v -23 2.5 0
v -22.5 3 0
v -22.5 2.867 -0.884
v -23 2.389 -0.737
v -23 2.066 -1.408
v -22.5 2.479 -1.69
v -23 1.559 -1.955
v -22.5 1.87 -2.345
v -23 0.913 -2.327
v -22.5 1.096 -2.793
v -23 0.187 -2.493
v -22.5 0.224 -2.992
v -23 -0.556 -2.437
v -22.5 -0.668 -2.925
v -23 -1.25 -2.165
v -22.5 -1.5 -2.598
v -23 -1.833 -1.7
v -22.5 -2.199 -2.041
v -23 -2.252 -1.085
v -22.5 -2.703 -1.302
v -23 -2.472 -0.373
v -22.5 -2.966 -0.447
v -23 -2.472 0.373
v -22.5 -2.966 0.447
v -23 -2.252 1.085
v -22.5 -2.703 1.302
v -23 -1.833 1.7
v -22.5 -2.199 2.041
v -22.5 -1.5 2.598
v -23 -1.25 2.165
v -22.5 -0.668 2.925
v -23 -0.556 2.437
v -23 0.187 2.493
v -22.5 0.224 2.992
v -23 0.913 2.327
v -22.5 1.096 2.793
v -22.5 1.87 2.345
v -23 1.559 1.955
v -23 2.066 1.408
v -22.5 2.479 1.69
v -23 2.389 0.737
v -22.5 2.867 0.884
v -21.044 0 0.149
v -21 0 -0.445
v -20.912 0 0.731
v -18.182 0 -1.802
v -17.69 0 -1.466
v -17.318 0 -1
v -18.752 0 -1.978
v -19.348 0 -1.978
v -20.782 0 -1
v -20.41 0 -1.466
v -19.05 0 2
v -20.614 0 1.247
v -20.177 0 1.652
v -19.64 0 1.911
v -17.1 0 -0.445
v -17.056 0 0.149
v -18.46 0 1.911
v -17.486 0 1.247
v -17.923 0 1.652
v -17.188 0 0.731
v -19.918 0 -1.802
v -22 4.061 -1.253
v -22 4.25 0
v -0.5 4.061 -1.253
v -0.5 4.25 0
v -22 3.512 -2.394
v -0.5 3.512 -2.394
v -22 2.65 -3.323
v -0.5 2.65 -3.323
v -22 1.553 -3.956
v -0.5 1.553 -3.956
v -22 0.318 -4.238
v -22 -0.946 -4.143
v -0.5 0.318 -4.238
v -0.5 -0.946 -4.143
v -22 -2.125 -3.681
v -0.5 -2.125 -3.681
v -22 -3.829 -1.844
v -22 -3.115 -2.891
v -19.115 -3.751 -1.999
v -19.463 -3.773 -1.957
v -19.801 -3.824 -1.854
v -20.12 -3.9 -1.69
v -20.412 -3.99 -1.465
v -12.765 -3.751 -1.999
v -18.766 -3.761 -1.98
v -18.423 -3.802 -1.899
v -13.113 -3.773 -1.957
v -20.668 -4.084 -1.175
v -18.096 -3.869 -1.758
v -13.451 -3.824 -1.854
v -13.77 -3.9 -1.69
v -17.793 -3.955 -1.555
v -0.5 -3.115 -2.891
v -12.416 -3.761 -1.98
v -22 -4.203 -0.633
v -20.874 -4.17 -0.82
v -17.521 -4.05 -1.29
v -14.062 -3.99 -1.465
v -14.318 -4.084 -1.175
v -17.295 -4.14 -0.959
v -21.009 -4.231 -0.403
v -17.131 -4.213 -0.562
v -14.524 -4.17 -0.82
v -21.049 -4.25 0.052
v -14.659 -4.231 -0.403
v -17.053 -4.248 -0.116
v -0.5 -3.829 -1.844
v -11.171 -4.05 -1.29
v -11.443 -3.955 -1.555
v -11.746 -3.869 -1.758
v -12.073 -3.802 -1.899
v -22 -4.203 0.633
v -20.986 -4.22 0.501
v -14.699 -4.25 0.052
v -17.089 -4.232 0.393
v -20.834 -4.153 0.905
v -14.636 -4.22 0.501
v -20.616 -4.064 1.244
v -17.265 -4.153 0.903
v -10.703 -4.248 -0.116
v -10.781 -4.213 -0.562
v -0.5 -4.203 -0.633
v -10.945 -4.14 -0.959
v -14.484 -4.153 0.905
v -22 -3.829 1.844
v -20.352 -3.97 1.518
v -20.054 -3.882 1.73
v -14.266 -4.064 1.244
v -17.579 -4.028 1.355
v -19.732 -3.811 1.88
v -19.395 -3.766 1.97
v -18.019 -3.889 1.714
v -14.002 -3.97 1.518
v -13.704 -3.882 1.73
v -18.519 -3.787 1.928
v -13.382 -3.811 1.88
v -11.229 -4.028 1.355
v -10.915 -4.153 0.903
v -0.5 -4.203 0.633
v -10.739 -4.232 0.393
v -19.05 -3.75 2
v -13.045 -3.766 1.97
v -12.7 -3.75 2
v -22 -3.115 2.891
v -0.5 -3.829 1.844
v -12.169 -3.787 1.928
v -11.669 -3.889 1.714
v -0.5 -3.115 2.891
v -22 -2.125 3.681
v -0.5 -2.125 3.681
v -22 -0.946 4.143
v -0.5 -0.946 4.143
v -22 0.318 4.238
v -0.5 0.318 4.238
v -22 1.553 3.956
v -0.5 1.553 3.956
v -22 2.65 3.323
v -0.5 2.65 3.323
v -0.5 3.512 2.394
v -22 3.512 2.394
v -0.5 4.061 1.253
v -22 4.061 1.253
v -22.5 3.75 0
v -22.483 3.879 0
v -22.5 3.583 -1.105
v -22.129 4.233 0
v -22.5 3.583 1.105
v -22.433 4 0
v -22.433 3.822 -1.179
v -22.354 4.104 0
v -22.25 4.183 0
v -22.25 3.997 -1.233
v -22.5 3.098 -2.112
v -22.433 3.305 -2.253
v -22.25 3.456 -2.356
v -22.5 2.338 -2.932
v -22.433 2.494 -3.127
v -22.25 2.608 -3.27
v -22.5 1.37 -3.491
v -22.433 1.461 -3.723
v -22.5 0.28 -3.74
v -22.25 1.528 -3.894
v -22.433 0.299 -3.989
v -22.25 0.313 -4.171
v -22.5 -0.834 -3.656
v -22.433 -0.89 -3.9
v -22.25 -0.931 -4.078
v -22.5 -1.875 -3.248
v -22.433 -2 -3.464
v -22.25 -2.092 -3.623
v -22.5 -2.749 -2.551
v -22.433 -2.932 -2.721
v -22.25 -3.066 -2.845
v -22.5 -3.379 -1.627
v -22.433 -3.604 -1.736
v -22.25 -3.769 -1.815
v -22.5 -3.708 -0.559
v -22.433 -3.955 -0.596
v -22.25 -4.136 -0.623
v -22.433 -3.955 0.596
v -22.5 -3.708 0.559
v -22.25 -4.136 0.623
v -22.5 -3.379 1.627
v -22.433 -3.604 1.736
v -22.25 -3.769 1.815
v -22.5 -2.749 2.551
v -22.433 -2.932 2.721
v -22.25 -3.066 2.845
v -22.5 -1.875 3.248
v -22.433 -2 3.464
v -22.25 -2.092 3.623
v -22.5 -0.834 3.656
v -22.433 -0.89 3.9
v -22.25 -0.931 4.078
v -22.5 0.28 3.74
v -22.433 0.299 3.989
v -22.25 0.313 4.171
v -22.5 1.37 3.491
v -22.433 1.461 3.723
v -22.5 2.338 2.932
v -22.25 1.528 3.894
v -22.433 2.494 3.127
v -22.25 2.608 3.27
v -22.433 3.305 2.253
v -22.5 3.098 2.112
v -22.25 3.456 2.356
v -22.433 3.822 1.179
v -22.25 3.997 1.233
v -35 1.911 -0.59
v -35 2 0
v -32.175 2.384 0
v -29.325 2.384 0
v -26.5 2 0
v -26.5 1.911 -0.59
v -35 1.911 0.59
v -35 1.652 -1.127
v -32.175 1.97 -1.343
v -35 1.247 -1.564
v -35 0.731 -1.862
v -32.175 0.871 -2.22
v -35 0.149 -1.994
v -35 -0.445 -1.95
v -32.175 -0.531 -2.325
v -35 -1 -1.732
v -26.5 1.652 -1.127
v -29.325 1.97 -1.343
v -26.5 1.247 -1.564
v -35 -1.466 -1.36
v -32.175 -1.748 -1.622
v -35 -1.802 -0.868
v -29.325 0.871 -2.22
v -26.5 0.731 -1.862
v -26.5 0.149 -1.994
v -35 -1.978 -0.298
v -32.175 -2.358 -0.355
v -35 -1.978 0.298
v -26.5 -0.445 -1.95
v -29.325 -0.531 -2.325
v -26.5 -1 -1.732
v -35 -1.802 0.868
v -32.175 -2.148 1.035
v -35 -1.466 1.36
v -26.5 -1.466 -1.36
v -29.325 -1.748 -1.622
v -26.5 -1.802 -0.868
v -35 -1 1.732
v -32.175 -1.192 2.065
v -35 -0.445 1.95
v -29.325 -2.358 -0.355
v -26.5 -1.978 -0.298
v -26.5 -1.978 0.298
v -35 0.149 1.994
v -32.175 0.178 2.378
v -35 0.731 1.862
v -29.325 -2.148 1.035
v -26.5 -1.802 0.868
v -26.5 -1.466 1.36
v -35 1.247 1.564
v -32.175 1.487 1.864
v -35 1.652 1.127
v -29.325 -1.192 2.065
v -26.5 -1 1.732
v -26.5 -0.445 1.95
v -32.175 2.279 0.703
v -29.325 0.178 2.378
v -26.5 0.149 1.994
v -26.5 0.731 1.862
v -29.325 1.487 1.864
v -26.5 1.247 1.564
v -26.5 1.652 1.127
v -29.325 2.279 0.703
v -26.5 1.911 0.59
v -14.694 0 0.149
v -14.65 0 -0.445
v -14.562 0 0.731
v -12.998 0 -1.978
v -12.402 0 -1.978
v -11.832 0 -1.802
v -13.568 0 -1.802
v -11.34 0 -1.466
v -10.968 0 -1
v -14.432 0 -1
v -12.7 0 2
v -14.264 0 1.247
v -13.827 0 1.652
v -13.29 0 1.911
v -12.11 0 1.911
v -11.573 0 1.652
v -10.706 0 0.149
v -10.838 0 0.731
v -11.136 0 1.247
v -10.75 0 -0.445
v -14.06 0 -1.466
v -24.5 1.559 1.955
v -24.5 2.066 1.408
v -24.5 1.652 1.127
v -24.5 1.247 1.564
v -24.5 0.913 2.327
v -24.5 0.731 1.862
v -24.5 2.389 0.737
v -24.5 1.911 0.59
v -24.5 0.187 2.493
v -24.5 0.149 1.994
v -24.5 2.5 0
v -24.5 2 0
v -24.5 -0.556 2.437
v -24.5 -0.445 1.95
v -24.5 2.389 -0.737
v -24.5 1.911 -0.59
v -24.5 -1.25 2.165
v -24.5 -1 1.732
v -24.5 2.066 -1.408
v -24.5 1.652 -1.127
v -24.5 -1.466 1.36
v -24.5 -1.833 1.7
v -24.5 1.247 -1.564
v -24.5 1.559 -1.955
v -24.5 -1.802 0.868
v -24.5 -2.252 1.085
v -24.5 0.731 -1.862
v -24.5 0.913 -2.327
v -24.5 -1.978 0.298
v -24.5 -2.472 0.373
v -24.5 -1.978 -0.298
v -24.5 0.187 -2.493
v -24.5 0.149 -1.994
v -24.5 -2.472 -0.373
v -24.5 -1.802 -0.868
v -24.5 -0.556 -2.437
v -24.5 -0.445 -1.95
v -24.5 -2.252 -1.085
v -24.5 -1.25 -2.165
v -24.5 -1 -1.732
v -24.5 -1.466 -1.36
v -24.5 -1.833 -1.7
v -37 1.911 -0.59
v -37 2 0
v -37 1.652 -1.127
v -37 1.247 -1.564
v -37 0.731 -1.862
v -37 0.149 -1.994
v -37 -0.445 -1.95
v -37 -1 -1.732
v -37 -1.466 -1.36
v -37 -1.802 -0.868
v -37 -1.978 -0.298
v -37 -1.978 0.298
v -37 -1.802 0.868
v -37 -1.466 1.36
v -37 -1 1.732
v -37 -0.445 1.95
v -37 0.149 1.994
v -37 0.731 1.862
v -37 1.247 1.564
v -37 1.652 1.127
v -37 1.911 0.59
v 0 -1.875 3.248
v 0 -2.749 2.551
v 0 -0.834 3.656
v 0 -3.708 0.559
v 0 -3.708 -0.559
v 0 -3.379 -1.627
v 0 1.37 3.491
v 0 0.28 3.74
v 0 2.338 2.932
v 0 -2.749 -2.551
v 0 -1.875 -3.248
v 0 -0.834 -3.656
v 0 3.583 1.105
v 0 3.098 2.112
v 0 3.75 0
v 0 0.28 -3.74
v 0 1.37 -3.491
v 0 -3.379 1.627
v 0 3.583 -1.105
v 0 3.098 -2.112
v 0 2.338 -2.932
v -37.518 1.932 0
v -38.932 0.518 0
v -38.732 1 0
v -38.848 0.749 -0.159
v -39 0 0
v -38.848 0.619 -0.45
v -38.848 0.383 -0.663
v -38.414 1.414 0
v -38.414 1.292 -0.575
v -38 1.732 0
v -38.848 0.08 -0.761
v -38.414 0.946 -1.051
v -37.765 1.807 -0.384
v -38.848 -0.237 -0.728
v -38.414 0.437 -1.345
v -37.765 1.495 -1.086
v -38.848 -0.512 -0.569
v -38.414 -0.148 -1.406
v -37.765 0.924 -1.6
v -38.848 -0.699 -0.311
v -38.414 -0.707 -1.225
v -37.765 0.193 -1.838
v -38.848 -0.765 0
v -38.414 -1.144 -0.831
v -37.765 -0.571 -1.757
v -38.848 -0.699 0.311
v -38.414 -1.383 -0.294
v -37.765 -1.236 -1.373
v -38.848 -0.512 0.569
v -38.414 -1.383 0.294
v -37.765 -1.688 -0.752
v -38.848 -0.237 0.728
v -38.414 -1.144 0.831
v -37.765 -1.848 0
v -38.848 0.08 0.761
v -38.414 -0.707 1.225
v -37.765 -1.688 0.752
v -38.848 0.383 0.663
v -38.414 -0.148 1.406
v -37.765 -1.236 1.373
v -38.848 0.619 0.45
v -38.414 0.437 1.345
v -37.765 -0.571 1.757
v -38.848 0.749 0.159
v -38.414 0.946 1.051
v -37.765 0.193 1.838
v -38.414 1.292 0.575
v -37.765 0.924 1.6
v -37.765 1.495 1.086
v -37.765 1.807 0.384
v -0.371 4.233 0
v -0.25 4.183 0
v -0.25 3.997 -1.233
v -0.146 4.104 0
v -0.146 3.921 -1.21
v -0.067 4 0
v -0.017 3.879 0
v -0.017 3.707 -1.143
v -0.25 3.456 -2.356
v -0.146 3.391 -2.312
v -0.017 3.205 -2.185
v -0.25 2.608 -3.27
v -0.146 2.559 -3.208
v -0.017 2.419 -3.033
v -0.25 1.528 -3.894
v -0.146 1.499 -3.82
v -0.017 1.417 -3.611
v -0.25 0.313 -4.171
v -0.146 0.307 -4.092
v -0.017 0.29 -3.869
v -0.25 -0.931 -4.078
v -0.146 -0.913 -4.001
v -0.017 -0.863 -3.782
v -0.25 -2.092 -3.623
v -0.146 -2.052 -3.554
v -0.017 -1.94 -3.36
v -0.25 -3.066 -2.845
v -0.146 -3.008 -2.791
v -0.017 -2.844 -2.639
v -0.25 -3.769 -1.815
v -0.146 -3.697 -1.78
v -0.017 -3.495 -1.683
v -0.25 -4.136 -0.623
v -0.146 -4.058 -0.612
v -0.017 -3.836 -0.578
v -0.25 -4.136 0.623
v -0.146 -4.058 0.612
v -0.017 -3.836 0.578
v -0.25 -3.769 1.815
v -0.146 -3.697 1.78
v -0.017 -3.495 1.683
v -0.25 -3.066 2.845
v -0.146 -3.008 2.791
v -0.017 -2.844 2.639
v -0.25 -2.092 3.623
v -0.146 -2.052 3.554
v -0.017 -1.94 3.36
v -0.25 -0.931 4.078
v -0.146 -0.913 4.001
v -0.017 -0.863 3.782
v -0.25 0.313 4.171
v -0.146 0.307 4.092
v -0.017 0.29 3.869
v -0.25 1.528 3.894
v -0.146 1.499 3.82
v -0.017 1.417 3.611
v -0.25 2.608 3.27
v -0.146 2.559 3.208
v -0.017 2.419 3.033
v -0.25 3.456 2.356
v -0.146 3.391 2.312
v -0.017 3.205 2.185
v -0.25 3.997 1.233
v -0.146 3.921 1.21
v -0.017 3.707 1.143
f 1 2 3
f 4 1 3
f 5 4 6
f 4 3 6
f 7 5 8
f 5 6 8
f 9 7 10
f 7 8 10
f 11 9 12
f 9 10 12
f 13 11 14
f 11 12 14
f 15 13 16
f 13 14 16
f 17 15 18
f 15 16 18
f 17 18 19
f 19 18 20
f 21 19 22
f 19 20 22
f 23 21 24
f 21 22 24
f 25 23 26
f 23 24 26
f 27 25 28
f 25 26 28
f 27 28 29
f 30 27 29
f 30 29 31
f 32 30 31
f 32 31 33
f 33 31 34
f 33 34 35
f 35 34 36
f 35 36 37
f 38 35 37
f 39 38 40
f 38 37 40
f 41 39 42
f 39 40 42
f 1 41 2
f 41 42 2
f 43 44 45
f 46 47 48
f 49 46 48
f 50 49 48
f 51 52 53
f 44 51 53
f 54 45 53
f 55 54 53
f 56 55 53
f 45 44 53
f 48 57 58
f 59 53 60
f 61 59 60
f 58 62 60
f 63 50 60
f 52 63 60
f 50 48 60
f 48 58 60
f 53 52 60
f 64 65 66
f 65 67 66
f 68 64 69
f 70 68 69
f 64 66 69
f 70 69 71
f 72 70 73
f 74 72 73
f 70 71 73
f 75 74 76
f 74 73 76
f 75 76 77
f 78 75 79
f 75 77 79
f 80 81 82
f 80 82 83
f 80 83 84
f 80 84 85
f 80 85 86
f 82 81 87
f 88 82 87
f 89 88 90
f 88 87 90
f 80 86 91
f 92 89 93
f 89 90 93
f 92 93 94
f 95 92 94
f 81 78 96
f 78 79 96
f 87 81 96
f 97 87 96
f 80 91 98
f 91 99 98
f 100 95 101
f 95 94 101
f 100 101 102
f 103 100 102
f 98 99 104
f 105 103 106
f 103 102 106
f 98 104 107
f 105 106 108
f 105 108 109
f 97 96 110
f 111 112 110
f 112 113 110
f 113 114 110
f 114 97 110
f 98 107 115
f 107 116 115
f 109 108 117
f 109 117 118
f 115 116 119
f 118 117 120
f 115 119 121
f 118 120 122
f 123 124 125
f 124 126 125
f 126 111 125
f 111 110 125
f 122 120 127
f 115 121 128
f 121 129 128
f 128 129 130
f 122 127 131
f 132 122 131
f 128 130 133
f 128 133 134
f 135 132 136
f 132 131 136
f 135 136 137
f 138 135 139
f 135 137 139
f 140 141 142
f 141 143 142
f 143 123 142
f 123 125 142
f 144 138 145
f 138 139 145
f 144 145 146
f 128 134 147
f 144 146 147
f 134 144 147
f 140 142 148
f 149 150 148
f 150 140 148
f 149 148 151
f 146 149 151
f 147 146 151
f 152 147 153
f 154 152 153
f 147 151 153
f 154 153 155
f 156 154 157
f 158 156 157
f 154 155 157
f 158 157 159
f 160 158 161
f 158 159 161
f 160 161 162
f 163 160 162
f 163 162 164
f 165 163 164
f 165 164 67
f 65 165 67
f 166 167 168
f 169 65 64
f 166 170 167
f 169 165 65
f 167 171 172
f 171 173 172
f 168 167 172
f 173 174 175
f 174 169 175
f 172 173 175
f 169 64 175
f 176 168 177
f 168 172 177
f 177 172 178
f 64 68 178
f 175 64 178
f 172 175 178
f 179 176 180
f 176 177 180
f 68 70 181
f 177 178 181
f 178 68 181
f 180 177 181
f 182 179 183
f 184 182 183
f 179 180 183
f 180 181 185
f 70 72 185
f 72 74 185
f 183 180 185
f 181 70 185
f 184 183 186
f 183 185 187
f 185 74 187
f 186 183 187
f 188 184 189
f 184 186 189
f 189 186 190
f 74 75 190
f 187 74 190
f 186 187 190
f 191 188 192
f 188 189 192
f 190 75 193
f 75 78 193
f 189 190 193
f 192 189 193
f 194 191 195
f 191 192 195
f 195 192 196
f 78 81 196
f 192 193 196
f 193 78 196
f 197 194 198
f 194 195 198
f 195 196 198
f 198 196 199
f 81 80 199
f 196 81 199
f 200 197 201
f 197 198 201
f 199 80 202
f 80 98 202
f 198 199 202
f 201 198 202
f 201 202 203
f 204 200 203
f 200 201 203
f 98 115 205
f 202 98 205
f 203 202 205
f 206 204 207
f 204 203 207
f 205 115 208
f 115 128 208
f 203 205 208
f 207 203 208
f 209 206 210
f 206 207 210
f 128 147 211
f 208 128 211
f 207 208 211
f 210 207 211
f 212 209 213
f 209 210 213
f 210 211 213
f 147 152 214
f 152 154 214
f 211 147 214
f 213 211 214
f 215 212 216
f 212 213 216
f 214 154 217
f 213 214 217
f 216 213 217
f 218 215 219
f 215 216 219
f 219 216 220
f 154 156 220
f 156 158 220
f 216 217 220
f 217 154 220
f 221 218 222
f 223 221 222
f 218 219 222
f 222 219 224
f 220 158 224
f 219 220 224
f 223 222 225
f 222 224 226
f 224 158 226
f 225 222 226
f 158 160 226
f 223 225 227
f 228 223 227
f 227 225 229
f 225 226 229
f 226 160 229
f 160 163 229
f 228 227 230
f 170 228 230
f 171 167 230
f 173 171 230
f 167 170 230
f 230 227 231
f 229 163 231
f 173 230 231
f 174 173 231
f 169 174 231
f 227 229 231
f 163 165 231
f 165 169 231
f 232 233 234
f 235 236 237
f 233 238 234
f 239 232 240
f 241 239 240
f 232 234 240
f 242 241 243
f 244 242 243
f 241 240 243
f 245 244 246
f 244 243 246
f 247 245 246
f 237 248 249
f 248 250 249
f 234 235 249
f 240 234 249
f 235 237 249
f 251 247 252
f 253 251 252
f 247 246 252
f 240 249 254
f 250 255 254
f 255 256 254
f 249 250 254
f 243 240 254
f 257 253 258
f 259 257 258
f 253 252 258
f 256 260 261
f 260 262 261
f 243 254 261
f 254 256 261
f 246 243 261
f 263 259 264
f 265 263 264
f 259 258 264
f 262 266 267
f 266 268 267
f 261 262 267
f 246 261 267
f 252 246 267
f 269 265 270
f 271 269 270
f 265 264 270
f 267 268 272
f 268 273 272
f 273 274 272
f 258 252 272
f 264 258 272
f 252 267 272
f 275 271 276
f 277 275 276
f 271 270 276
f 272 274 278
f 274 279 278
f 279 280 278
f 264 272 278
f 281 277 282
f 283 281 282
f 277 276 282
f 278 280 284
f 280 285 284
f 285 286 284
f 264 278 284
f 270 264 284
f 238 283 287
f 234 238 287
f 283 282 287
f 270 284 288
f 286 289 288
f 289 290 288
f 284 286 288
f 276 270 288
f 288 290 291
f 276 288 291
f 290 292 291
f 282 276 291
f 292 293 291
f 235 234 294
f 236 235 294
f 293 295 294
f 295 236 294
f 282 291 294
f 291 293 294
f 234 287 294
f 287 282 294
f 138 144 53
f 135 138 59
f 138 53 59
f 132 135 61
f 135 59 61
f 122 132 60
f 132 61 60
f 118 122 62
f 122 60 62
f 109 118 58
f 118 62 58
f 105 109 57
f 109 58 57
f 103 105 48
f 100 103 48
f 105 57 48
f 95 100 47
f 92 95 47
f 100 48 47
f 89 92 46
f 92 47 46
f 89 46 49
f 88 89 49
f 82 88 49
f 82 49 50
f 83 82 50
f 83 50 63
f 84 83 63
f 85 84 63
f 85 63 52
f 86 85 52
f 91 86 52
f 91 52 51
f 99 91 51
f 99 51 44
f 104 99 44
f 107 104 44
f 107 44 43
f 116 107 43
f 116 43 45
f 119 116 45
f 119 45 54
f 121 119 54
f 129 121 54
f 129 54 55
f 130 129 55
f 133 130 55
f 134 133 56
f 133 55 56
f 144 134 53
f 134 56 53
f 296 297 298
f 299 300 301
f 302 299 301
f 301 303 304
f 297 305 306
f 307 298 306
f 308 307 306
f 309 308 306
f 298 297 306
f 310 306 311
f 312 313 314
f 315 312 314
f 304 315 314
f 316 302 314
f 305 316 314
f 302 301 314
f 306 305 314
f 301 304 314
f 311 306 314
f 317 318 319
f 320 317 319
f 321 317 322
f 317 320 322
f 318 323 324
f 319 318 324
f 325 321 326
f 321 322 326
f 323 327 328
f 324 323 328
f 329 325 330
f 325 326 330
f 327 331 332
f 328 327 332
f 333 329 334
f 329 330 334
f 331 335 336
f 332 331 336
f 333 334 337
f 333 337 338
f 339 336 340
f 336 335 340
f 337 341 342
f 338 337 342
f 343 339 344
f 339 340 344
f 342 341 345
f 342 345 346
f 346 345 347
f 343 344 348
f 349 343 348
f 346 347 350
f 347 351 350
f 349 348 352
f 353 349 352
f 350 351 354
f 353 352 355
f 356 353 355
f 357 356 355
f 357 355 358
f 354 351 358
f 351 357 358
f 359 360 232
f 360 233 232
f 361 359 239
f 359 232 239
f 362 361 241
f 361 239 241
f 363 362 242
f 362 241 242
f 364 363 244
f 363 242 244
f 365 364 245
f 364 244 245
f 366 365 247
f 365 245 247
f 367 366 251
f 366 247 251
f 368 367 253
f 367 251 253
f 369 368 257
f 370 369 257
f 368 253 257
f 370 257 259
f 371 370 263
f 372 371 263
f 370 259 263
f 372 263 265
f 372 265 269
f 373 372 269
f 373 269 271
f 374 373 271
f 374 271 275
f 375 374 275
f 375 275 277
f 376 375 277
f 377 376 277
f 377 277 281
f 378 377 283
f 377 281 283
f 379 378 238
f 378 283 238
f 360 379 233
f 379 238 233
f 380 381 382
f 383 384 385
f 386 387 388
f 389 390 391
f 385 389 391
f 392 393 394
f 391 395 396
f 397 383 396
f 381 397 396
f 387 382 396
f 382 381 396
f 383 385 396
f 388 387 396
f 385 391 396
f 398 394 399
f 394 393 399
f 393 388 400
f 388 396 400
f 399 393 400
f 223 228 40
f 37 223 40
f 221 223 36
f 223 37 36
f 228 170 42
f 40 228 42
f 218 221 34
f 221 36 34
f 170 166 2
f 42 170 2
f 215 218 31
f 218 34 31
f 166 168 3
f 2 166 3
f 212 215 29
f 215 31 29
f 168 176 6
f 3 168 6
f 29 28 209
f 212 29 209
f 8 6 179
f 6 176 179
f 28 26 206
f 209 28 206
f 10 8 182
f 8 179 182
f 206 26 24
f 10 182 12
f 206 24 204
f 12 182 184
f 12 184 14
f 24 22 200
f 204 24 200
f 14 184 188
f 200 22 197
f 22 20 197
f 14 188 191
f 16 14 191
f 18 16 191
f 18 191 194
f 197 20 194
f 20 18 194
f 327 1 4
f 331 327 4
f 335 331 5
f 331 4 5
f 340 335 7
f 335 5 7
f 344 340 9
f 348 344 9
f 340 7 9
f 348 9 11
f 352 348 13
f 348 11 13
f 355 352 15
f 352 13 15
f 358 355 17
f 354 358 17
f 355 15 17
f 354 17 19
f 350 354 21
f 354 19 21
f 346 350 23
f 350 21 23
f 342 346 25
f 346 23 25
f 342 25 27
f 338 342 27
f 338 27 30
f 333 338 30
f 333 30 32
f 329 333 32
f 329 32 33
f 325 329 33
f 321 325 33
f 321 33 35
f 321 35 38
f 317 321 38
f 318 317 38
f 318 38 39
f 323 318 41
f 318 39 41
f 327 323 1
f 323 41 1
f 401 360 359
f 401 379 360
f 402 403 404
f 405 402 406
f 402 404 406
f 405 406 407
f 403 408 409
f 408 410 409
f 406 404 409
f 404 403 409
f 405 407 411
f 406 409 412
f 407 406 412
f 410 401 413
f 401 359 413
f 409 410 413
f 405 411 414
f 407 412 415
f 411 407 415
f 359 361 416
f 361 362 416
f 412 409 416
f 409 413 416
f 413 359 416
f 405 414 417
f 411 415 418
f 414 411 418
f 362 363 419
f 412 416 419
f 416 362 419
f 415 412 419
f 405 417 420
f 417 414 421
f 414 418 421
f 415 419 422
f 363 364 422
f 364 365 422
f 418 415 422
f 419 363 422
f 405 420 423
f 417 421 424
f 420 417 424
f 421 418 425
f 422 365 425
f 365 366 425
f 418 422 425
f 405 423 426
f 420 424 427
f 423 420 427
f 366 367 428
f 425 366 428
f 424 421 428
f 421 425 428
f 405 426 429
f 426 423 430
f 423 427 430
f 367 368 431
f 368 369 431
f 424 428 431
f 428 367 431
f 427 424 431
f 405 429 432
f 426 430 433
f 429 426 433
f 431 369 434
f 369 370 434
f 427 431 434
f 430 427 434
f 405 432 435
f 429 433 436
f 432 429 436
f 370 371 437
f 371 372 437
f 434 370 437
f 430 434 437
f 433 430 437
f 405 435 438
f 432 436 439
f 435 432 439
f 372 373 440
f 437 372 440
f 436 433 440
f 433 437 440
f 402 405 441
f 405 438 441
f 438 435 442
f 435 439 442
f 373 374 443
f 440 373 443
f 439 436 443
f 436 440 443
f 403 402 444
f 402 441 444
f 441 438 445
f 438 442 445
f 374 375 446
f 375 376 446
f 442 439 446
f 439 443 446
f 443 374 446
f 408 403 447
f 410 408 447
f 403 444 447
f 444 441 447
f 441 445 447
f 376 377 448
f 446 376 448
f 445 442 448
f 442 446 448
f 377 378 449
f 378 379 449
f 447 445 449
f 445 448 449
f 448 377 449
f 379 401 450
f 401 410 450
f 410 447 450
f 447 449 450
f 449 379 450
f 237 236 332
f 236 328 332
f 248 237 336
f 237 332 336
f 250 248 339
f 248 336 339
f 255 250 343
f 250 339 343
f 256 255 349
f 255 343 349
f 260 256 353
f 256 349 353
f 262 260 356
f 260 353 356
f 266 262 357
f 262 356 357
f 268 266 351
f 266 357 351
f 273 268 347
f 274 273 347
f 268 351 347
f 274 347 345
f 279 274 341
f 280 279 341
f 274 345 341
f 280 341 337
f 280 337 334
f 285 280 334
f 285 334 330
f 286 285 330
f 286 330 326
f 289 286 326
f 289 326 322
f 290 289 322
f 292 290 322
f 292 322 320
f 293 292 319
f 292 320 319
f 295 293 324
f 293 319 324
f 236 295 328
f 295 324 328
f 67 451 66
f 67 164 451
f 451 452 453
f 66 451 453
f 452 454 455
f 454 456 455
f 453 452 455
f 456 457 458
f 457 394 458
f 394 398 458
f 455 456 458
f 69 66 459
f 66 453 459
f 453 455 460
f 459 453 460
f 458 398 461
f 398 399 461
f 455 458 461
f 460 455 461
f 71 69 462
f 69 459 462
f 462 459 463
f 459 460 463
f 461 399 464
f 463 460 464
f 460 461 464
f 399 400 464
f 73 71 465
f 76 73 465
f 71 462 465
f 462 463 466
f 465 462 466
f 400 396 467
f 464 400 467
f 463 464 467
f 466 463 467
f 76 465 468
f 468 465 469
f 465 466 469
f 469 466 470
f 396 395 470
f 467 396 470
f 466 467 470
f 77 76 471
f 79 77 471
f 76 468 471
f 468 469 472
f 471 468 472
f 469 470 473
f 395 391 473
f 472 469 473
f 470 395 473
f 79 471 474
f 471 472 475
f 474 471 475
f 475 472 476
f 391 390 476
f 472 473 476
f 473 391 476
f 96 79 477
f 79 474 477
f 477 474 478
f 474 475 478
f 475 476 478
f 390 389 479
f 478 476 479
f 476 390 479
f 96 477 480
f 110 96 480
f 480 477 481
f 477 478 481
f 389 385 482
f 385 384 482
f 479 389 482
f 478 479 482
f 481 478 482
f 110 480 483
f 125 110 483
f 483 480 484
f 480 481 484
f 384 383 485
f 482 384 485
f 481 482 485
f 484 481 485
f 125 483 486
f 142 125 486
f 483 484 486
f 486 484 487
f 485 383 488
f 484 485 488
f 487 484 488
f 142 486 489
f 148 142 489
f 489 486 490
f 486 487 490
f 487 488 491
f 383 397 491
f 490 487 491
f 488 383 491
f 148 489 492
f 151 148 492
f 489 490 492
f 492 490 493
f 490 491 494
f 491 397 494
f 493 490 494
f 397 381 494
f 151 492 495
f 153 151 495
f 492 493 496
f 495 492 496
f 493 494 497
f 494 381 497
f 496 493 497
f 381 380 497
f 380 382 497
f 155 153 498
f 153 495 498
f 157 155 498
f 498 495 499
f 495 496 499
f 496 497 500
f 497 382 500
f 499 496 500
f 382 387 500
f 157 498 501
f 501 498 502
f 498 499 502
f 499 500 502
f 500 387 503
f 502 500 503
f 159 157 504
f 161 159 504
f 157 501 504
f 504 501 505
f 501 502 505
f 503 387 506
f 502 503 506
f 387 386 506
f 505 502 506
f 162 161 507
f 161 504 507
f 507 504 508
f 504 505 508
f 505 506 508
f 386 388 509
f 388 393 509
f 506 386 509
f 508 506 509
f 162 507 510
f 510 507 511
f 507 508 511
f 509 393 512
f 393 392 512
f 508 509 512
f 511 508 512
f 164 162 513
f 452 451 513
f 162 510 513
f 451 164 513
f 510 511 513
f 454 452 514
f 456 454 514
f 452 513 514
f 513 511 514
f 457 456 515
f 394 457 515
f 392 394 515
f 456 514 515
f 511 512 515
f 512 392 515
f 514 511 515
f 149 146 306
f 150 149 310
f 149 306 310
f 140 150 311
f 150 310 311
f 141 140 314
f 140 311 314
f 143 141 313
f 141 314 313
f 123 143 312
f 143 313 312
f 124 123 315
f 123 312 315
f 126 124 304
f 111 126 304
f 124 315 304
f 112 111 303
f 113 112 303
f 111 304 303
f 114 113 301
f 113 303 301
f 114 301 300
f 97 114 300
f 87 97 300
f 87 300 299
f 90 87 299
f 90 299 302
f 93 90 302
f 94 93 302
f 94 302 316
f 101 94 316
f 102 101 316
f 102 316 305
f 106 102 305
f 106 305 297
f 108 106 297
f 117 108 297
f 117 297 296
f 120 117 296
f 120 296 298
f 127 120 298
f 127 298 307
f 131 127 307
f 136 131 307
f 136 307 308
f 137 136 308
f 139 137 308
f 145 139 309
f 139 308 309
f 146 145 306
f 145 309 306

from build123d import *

# Parameters (mm, degrees)
CHAMFER1_SIZE      = 0.5
FILLET1_R          = 0.5
SKETCH3_R          = 2
CUT_EXTRUDE1_DEPTH = 25.4


with BuildPart() as part:
    # Sketch1 → Revolve1 (revolve)
    with BuildSketch(Plane.XY):
        with BuildLine():
            Line((0, 0), (-39, 0))
            ThreePointArc((-39, 0), (-38.414213562, 1.414213562), (-37, 2))
            Line((-37, 2), (-35, 2))
            ThreePointArc((-35, 2), (-30.75, 2.432654399), (-26.5, 2))
            Line((-26.5, 2), (-24.5, 2))
            Line((-24.5, 2), (-24.5, 2.5))
            Line((-24.5, 2.5), (-22.5, 2.5))
            Line((-22.5, 2.5), (-22.5, 4.25))
            Line((-22.5, 4.25), (0, 4.25))
            Line((0, 4.25), (0, 0))
        make_face()
    revolve(axis=Axis((-39, 0, 0), (-1, 0, 0)))

    # Chamfer1
    chamfer1_edges = [part.edges().sort_by_distance(p)[0] for p in [
        (-22.5, -2.5, 0),
    ]]
    chamfer(chamfer1_edges, length=CHAMFER1_SIZE)

    # Fillet1
    fillet1_edges = [part.edges().sort_by_distance(p)[0] for p in [
        (0, -4.25, 0),
        (-22.5, -4.25, 0),
    ]]
    fillet(fillet1_edges, radius=FILLET1_R)

    # Sketch3 → Cut-Extrude1 (cut)
    with BuildSketch(Plane(origin=(0, 0, 0), x_dir=(1, 0, 0), z_dir=(0, 1, 0))):
        with Locations(Location((-19.05, 0, 0), (0, 0, 270))):
            Circle(SKETCH3_R)
        with Locations(Location((-12.7, 0, 0), (0, 0, 270))):
            Circle(SKETCH3_R)
    extrude(amount=-CUT_EXTRUDE1_DEPTH, mode=Mode.SUBTRACT)


solid = part.part
